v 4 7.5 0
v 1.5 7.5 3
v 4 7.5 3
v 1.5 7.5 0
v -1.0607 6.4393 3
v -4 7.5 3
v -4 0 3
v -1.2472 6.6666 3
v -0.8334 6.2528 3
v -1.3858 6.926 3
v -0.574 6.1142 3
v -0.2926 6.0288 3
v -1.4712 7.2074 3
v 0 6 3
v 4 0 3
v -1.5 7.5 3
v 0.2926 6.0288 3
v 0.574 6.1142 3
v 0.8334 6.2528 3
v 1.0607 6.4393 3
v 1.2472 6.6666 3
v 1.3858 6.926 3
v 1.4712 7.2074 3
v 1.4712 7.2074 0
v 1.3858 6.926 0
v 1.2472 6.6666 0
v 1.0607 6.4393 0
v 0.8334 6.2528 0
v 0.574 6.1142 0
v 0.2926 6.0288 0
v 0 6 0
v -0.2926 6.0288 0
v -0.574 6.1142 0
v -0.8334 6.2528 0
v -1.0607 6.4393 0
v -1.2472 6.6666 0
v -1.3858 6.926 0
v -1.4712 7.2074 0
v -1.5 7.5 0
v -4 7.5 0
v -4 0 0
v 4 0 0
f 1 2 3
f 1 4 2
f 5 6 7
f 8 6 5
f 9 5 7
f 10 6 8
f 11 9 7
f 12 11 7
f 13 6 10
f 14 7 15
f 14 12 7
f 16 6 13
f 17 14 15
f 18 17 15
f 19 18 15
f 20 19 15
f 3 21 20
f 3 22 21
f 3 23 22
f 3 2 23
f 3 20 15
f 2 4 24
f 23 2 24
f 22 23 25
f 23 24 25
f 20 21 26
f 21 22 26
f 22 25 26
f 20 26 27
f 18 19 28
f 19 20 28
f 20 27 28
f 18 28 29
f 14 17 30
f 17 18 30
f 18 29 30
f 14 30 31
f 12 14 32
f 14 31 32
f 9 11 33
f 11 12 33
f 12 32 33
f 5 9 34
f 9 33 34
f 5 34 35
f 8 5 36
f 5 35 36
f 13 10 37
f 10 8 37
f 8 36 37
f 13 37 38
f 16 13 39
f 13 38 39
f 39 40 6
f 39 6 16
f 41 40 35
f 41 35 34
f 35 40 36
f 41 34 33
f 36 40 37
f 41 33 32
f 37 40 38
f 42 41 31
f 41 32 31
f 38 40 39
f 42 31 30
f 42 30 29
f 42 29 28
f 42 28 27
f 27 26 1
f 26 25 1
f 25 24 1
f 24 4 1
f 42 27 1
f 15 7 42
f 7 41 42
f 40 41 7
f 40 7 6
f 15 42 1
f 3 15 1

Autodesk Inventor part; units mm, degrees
ref_plane "YZ Plane" through (0, 0, 0) normal (1, 0, 0) x (0, 1, 0)
ref_plane "XZ Plane" through (0, 0, 0) normal (0, 1, 0) x (-1, 0, 0)
ref_plane "XY Plane" through (0, 0, 0) normal (0, 0, 1) x (1, 0, 0)
sketch "草图1" plane through (0, 0, 0) normal (0, 0, 1) x (1, 0, 0)
  line L0 (-4, 0) -> (4, 0)
  line L1 (-4, 0) -> (-4, 7.5)
  line L2 (4, 0) -> (4, 7.5)
  arc A0 (-1.5, 7.5) -> (1.5, 7.5) centre (0, 7.5) ccw
  line L3 (-4, 7.5) -> (-1.5, 7.5)
  line L4 (1.5, 7.5) -> (4, 7.5)
  line L5 (0, 7.5) -> (0, 0) construction
  dimension "长度" = 8
  dimension "高度" = 7.5
  dimension "d3" = 7.5
  dimension "孔径" = 3
  dimension "d5" = 7.5
extrude "拉伸1" add sketch "草图1" along normal blind 3
equation "\"d3\" = 高度"
equation "\"d5\" = 高度"
properties part number "顶杆支架" material "木材(桦木)"
